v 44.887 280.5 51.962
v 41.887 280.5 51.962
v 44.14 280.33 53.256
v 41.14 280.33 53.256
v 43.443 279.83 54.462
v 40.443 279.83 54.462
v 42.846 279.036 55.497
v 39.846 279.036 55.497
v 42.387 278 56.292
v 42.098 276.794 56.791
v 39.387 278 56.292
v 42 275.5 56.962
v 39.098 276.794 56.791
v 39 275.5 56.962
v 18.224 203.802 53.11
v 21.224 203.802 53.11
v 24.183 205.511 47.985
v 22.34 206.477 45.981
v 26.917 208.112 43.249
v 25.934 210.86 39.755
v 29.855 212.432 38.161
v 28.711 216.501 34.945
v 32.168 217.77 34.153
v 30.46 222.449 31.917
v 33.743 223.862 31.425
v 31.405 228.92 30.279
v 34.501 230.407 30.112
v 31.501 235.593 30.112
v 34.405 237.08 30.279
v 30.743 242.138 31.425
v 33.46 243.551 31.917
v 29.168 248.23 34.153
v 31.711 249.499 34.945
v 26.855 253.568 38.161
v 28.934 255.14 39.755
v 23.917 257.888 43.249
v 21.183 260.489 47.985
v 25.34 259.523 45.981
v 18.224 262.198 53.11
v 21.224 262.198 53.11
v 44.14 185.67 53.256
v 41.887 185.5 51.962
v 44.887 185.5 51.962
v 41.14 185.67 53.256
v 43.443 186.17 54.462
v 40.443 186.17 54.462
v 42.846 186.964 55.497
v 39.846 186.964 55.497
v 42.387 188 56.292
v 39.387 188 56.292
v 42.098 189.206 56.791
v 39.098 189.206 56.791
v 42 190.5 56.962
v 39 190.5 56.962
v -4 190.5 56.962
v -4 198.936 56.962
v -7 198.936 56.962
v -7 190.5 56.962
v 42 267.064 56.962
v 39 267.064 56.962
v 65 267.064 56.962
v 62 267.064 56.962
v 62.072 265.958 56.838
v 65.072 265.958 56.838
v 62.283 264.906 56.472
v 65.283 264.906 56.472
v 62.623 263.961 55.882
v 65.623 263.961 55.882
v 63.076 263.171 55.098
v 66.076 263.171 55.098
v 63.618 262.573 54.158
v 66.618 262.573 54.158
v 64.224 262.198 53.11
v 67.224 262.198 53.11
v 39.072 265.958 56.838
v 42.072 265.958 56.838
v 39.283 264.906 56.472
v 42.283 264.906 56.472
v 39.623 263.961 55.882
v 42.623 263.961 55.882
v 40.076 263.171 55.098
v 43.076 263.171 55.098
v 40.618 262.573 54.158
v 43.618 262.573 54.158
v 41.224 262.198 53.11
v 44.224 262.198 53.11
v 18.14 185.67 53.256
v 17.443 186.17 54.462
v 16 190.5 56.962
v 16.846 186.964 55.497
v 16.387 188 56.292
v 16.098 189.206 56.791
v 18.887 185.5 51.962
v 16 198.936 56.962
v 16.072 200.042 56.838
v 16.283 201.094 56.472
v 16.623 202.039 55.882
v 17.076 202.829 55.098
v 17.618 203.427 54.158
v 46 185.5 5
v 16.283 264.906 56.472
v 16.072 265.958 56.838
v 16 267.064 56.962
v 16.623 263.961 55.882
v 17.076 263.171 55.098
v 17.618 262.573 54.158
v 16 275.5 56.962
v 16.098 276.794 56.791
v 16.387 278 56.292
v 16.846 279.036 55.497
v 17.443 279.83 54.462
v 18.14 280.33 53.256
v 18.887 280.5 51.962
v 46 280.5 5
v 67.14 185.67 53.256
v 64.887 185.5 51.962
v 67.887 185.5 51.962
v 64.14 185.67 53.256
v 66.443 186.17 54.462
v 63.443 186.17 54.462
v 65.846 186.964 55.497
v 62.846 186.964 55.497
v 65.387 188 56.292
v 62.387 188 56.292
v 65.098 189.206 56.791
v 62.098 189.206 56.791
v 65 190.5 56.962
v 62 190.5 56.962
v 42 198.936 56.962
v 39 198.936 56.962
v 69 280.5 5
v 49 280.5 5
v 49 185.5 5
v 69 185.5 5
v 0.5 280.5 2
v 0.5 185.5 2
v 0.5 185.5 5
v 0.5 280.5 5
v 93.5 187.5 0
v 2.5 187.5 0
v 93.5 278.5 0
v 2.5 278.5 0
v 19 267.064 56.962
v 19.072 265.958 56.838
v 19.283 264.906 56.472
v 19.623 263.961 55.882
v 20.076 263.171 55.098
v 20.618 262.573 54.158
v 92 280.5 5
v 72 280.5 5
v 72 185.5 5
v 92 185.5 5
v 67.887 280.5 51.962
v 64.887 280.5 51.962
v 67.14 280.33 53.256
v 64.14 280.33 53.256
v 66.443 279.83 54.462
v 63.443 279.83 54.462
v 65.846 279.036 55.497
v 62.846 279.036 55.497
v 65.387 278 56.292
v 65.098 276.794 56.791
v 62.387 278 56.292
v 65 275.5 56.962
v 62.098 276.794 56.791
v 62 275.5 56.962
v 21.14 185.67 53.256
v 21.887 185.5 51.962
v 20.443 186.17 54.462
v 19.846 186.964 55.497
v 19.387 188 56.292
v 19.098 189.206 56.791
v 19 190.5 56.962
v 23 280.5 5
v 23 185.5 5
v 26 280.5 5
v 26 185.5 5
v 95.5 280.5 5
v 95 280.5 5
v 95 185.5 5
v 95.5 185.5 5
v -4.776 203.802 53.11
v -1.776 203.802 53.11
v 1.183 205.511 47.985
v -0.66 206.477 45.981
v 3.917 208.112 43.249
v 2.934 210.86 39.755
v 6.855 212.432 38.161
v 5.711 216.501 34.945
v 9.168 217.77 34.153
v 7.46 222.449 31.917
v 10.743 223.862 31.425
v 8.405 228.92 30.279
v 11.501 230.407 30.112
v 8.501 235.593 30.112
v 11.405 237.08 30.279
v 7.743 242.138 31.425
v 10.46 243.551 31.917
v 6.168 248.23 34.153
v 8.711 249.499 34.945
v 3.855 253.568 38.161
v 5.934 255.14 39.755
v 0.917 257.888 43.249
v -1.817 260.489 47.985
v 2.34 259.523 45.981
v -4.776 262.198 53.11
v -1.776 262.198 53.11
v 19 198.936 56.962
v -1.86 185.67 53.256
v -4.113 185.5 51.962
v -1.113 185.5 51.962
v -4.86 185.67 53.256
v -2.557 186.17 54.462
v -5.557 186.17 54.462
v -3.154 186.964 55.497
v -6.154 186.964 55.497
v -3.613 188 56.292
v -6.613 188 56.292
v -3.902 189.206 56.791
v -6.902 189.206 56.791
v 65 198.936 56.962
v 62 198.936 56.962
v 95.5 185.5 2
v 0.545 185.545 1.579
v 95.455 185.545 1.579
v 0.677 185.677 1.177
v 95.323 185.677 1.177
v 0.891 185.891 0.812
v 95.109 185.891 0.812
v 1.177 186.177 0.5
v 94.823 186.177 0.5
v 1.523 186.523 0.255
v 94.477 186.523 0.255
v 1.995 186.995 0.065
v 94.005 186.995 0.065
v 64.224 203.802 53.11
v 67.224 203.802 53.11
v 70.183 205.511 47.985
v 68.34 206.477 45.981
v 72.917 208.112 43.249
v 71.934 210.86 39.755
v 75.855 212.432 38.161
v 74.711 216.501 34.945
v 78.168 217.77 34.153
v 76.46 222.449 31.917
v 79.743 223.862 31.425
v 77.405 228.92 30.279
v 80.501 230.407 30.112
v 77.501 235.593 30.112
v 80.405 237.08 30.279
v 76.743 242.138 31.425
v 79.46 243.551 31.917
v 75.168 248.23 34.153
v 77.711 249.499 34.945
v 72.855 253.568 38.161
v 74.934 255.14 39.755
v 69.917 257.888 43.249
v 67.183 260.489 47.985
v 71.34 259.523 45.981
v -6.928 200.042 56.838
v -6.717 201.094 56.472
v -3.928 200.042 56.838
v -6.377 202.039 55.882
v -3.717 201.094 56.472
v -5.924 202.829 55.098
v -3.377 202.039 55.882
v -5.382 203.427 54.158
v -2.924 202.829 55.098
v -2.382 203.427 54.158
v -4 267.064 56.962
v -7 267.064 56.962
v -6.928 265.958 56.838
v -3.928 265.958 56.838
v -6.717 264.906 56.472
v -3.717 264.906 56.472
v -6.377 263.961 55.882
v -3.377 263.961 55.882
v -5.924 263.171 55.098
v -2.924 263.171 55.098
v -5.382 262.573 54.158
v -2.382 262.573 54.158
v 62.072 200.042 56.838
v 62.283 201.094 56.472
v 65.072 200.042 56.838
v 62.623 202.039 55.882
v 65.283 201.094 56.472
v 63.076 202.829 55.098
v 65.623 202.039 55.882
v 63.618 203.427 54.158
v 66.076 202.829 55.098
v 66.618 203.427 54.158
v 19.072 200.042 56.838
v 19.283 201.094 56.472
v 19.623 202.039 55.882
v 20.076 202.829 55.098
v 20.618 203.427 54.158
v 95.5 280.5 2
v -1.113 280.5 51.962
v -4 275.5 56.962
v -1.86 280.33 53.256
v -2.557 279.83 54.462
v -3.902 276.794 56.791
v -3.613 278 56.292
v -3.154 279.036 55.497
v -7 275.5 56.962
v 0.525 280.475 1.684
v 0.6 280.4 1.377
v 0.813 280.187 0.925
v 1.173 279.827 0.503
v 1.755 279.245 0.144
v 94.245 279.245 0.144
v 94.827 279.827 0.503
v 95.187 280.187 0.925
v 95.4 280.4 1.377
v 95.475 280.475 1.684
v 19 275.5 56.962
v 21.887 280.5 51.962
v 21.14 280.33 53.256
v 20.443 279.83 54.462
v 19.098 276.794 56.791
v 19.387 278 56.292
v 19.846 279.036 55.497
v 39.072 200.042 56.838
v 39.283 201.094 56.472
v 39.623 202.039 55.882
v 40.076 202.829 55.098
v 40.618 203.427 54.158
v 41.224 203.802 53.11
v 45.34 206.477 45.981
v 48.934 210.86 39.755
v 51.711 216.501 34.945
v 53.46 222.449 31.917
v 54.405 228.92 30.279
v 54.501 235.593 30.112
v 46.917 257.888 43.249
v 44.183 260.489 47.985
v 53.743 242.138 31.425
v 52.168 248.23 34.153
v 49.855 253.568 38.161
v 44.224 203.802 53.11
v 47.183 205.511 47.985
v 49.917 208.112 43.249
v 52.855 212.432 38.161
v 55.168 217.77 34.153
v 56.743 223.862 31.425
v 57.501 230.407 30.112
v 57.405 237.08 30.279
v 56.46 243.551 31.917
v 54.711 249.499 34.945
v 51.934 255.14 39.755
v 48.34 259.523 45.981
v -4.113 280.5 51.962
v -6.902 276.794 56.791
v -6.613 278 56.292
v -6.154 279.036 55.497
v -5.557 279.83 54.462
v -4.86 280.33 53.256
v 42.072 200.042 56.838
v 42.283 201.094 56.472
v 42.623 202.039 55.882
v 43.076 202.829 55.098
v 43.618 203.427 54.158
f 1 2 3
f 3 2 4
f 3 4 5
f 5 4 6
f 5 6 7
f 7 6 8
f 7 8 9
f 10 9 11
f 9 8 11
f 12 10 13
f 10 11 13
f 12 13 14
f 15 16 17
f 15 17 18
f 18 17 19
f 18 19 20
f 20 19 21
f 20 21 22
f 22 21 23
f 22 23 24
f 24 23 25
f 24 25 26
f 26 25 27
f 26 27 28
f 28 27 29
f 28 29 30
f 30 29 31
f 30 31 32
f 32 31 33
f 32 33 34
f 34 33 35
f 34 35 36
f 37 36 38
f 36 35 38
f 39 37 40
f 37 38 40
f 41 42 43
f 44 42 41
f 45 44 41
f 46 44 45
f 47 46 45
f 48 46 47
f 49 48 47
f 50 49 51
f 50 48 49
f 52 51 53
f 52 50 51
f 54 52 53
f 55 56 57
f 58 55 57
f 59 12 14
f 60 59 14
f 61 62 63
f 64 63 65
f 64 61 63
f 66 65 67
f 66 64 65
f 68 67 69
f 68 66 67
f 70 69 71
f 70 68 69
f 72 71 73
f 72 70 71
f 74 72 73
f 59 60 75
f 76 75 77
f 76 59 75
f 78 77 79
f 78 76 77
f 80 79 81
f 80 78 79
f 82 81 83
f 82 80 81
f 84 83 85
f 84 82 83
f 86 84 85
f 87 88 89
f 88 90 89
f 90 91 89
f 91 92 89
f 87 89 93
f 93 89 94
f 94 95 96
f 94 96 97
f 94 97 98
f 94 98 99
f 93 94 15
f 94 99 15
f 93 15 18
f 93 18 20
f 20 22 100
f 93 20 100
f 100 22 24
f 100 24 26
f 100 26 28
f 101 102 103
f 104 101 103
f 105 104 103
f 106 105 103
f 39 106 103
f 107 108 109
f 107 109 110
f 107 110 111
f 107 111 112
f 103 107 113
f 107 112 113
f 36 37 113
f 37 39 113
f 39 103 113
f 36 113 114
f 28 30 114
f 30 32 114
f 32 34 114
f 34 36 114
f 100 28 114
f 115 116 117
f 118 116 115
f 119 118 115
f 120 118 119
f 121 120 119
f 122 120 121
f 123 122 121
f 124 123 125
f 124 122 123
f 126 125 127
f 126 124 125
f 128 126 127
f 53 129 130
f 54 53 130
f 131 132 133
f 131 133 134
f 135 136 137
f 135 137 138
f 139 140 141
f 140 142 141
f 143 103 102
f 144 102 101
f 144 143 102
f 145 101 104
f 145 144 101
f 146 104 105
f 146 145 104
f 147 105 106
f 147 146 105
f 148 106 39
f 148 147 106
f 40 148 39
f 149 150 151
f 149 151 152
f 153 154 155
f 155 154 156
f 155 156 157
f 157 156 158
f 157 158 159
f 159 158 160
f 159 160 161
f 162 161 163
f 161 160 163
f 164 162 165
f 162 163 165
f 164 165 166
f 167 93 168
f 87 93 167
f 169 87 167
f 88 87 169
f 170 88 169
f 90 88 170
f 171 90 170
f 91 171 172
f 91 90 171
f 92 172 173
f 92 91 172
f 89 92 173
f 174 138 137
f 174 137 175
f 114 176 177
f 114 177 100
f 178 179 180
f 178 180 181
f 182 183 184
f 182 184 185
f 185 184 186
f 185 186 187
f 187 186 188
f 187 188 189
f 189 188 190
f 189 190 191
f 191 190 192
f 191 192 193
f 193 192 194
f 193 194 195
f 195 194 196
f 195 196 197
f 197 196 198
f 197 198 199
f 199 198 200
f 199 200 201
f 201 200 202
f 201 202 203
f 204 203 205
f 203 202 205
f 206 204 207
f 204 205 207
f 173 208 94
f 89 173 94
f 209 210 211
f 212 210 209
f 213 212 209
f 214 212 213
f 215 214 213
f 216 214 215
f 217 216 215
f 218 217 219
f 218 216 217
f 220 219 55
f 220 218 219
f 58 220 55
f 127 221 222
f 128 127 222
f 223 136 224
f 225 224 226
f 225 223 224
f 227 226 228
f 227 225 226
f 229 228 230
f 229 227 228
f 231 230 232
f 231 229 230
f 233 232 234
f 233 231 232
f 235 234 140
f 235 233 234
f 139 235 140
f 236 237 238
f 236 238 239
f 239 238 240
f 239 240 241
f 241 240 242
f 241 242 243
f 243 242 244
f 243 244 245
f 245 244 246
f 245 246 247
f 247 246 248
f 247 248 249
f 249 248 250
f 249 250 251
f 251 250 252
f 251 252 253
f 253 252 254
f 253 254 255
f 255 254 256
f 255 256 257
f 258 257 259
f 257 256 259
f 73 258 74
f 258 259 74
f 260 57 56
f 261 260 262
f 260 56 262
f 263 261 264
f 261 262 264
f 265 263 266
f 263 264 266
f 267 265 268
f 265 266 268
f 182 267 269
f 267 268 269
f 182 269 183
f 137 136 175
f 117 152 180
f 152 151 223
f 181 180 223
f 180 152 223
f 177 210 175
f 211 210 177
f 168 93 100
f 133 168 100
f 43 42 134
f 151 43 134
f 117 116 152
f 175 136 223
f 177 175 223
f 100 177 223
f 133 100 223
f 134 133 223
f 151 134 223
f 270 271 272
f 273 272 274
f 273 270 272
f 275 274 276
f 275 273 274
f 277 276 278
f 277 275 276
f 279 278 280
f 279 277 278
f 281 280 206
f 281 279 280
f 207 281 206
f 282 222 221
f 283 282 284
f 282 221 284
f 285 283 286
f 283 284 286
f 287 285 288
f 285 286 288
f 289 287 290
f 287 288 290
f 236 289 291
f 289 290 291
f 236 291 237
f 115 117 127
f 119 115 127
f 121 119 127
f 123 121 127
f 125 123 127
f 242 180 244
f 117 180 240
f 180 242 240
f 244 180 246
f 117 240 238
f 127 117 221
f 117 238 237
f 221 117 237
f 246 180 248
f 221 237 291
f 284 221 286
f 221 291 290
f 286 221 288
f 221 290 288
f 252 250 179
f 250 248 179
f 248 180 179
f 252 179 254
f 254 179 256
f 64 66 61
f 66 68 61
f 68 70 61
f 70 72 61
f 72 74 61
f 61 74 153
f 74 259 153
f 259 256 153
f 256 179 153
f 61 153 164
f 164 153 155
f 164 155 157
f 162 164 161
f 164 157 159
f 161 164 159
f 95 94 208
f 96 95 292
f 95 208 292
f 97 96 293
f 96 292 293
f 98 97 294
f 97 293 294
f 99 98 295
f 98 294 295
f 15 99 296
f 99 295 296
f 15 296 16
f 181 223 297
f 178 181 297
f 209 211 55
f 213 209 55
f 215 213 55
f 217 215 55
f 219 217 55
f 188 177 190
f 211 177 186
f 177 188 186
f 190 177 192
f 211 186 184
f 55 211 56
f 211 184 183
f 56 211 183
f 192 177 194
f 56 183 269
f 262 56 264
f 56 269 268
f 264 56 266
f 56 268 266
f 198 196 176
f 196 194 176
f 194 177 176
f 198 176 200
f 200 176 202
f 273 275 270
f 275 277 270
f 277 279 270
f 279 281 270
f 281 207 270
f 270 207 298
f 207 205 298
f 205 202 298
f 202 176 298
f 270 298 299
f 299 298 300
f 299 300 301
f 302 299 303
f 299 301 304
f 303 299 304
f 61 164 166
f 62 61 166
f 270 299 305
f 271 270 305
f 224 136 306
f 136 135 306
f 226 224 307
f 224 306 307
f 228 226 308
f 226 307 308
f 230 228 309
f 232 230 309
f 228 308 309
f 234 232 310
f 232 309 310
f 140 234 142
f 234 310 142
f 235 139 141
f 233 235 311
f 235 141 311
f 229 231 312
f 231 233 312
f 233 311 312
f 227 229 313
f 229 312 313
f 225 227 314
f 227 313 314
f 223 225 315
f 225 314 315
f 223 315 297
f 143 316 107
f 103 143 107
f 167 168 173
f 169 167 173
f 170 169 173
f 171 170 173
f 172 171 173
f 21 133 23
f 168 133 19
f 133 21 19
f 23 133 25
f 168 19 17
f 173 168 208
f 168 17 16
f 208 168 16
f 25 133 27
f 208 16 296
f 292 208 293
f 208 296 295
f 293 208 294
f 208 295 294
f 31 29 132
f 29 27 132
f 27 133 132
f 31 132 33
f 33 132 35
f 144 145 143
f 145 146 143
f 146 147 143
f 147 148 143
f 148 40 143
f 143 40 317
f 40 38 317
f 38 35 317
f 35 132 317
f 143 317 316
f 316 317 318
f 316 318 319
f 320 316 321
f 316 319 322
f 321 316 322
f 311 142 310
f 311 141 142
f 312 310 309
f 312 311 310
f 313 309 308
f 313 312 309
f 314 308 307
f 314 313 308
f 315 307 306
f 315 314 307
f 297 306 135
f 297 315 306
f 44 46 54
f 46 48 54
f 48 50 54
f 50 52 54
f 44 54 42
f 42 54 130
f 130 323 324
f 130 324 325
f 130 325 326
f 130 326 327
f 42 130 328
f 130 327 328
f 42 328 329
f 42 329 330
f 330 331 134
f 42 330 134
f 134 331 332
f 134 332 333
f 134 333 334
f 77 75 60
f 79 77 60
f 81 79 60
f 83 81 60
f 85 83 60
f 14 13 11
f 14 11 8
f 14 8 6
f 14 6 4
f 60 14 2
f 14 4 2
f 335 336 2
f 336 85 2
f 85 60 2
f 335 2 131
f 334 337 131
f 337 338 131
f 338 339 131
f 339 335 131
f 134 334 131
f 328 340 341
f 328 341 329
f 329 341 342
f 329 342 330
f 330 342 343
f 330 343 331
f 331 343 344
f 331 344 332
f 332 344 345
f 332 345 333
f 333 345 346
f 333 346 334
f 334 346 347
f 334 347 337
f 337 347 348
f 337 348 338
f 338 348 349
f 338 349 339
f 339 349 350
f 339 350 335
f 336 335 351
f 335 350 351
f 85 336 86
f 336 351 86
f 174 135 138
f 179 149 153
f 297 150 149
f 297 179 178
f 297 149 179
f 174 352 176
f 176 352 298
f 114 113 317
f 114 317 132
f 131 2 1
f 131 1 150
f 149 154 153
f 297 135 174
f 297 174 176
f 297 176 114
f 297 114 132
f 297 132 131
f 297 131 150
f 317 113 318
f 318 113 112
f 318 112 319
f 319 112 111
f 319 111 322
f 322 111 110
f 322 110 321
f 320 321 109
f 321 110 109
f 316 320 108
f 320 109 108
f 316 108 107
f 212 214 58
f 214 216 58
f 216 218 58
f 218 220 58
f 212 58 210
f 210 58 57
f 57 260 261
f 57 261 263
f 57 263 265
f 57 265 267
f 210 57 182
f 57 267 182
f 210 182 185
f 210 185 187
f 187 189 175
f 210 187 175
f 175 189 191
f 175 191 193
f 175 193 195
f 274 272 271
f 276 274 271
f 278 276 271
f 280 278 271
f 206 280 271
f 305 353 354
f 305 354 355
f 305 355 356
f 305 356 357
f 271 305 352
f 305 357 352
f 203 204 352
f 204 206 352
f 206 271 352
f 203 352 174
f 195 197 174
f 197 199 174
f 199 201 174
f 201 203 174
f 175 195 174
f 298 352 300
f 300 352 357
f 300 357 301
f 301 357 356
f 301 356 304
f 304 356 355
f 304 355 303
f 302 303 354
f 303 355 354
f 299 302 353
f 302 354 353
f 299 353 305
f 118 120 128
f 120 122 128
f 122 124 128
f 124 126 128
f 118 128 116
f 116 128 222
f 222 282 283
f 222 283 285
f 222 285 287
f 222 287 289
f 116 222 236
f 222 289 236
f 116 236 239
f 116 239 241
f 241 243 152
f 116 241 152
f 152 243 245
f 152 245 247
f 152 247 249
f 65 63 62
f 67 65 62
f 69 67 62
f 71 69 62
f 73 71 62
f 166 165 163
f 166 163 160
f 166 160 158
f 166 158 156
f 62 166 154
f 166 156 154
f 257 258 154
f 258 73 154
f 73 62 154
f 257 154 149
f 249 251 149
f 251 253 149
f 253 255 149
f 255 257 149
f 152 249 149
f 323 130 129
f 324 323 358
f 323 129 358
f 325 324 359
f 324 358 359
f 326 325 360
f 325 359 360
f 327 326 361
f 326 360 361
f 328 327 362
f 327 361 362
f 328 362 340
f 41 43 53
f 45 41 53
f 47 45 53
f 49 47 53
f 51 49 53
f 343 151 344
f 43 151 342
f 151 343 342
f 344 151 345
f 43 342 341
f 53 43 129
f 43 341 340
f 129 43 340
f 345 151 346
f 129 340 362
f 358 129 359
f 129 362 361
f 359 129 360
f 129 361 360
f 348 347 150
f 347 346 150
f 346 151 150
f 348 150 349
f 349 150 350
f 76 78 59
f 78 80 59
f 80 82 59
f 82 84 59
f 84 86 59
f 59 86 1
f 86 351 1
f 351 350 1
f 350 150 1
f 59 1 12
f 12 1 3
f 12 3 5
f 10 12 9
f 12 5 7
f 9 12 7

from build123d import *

# Parameters (mm, degrees)
SKETCH024_W     = 95
SKETCH024_H     = 95
PAD016_DEPTH    = 5
PAD017_DEPTH    = 95
SKETCH029_R     = 30
POCKET009_DEPTH = 102.501
FILLET022_R     = 5
FILLET023_R     = 2


with BuildPart() as part:
    # Sketch024 → Pad016 (new body)
    with BuildSketch(Plane.XY):
        Rectangle(SKETCH024_W, SKETCH024_H)
    extrude(amount=PAD016_DEPTH)

    # Sketch025 (on DatumPlane) → Pad017 (join)
    with BuildSketch(Plane(origin=(0, 47.5, 0), x_dir=(-1, 0, 0), z_dir=(0, 1, 0))):
        Polygon((-47, 5), (-17, 56.961524), (-14, 56.961524), (-44, 5), align=None)
        Polygon((-24, 5), (6, 56.961524), (9, 56.961524), (-21, 5), align=None)
        Polygon((-1, 5), (29, 56.961524), (32, 56.961524), (2, 5), align=None)
        Polygon((22, 5), (52, 56.961524), (55, 56.961524), (25, 5), align=None)
    extrude(amount=-PAD017_DEPTH)

    # Sketch029 (on DatumPlane) → Pocket009 (cut, through all)
    with BuildSketch(Plane.YZ.offset(47.5)):
        with Locations((0, 60)):
            Circle(SKETCH029_R)
    extrude(amount=-POCKET009_DEPTH, mode=Mode.SUBTRACT)

    # Fillet022
    fillet022_edges = [part.edges().sort_by_distance(p)[0] for p in [
        (15.5, -47.5, 56.961524),
        (15.5, -29.845731, 56.961524),
        (-7.5, -47.5, 56.961524),
        (-7.5, -29.845731, 56.961524),
        (-30.5, -47.5, 56.961524),
        (-30.5, -29.845731, 56.961524),
        (-53.5, -47.5, 56.961524),
        (-53.5, -29.845731, 56.961524),
        (15.5, 29.845731, 56.961524),
        (15.5, 47.5, 56.961524),
        (-7.5, 29.845731, 56.961524),
        (-7.5, 47.5, 56.961524),
        (-30.5, 29.845731, 56.961524),
        (-30.5, 47.5, 56.961524),
        (-53.5, 29.845731, 56.961524),
        (-53.5, 47.5, 56.961524),
    ]]
    fillet(fillet022_edges, radius=FILLET022_R)

    # Fillet023
    fillet023_edges = [part.edges().sort_by_distance(p)[0] for p in [
        (0, -47.5, 0),
        (47.5, 0, 0),
        (0, 47.5, 0),
        (-47.5, 0, 0),
    ]]
    fillet(fillet023_edges, radius=FILLET023_R)


with BuildPart() as part_1:
    # Body011 placement: moved
    add(part.part.moved(Location((48, 233, 0))))


solid = part_1.part
